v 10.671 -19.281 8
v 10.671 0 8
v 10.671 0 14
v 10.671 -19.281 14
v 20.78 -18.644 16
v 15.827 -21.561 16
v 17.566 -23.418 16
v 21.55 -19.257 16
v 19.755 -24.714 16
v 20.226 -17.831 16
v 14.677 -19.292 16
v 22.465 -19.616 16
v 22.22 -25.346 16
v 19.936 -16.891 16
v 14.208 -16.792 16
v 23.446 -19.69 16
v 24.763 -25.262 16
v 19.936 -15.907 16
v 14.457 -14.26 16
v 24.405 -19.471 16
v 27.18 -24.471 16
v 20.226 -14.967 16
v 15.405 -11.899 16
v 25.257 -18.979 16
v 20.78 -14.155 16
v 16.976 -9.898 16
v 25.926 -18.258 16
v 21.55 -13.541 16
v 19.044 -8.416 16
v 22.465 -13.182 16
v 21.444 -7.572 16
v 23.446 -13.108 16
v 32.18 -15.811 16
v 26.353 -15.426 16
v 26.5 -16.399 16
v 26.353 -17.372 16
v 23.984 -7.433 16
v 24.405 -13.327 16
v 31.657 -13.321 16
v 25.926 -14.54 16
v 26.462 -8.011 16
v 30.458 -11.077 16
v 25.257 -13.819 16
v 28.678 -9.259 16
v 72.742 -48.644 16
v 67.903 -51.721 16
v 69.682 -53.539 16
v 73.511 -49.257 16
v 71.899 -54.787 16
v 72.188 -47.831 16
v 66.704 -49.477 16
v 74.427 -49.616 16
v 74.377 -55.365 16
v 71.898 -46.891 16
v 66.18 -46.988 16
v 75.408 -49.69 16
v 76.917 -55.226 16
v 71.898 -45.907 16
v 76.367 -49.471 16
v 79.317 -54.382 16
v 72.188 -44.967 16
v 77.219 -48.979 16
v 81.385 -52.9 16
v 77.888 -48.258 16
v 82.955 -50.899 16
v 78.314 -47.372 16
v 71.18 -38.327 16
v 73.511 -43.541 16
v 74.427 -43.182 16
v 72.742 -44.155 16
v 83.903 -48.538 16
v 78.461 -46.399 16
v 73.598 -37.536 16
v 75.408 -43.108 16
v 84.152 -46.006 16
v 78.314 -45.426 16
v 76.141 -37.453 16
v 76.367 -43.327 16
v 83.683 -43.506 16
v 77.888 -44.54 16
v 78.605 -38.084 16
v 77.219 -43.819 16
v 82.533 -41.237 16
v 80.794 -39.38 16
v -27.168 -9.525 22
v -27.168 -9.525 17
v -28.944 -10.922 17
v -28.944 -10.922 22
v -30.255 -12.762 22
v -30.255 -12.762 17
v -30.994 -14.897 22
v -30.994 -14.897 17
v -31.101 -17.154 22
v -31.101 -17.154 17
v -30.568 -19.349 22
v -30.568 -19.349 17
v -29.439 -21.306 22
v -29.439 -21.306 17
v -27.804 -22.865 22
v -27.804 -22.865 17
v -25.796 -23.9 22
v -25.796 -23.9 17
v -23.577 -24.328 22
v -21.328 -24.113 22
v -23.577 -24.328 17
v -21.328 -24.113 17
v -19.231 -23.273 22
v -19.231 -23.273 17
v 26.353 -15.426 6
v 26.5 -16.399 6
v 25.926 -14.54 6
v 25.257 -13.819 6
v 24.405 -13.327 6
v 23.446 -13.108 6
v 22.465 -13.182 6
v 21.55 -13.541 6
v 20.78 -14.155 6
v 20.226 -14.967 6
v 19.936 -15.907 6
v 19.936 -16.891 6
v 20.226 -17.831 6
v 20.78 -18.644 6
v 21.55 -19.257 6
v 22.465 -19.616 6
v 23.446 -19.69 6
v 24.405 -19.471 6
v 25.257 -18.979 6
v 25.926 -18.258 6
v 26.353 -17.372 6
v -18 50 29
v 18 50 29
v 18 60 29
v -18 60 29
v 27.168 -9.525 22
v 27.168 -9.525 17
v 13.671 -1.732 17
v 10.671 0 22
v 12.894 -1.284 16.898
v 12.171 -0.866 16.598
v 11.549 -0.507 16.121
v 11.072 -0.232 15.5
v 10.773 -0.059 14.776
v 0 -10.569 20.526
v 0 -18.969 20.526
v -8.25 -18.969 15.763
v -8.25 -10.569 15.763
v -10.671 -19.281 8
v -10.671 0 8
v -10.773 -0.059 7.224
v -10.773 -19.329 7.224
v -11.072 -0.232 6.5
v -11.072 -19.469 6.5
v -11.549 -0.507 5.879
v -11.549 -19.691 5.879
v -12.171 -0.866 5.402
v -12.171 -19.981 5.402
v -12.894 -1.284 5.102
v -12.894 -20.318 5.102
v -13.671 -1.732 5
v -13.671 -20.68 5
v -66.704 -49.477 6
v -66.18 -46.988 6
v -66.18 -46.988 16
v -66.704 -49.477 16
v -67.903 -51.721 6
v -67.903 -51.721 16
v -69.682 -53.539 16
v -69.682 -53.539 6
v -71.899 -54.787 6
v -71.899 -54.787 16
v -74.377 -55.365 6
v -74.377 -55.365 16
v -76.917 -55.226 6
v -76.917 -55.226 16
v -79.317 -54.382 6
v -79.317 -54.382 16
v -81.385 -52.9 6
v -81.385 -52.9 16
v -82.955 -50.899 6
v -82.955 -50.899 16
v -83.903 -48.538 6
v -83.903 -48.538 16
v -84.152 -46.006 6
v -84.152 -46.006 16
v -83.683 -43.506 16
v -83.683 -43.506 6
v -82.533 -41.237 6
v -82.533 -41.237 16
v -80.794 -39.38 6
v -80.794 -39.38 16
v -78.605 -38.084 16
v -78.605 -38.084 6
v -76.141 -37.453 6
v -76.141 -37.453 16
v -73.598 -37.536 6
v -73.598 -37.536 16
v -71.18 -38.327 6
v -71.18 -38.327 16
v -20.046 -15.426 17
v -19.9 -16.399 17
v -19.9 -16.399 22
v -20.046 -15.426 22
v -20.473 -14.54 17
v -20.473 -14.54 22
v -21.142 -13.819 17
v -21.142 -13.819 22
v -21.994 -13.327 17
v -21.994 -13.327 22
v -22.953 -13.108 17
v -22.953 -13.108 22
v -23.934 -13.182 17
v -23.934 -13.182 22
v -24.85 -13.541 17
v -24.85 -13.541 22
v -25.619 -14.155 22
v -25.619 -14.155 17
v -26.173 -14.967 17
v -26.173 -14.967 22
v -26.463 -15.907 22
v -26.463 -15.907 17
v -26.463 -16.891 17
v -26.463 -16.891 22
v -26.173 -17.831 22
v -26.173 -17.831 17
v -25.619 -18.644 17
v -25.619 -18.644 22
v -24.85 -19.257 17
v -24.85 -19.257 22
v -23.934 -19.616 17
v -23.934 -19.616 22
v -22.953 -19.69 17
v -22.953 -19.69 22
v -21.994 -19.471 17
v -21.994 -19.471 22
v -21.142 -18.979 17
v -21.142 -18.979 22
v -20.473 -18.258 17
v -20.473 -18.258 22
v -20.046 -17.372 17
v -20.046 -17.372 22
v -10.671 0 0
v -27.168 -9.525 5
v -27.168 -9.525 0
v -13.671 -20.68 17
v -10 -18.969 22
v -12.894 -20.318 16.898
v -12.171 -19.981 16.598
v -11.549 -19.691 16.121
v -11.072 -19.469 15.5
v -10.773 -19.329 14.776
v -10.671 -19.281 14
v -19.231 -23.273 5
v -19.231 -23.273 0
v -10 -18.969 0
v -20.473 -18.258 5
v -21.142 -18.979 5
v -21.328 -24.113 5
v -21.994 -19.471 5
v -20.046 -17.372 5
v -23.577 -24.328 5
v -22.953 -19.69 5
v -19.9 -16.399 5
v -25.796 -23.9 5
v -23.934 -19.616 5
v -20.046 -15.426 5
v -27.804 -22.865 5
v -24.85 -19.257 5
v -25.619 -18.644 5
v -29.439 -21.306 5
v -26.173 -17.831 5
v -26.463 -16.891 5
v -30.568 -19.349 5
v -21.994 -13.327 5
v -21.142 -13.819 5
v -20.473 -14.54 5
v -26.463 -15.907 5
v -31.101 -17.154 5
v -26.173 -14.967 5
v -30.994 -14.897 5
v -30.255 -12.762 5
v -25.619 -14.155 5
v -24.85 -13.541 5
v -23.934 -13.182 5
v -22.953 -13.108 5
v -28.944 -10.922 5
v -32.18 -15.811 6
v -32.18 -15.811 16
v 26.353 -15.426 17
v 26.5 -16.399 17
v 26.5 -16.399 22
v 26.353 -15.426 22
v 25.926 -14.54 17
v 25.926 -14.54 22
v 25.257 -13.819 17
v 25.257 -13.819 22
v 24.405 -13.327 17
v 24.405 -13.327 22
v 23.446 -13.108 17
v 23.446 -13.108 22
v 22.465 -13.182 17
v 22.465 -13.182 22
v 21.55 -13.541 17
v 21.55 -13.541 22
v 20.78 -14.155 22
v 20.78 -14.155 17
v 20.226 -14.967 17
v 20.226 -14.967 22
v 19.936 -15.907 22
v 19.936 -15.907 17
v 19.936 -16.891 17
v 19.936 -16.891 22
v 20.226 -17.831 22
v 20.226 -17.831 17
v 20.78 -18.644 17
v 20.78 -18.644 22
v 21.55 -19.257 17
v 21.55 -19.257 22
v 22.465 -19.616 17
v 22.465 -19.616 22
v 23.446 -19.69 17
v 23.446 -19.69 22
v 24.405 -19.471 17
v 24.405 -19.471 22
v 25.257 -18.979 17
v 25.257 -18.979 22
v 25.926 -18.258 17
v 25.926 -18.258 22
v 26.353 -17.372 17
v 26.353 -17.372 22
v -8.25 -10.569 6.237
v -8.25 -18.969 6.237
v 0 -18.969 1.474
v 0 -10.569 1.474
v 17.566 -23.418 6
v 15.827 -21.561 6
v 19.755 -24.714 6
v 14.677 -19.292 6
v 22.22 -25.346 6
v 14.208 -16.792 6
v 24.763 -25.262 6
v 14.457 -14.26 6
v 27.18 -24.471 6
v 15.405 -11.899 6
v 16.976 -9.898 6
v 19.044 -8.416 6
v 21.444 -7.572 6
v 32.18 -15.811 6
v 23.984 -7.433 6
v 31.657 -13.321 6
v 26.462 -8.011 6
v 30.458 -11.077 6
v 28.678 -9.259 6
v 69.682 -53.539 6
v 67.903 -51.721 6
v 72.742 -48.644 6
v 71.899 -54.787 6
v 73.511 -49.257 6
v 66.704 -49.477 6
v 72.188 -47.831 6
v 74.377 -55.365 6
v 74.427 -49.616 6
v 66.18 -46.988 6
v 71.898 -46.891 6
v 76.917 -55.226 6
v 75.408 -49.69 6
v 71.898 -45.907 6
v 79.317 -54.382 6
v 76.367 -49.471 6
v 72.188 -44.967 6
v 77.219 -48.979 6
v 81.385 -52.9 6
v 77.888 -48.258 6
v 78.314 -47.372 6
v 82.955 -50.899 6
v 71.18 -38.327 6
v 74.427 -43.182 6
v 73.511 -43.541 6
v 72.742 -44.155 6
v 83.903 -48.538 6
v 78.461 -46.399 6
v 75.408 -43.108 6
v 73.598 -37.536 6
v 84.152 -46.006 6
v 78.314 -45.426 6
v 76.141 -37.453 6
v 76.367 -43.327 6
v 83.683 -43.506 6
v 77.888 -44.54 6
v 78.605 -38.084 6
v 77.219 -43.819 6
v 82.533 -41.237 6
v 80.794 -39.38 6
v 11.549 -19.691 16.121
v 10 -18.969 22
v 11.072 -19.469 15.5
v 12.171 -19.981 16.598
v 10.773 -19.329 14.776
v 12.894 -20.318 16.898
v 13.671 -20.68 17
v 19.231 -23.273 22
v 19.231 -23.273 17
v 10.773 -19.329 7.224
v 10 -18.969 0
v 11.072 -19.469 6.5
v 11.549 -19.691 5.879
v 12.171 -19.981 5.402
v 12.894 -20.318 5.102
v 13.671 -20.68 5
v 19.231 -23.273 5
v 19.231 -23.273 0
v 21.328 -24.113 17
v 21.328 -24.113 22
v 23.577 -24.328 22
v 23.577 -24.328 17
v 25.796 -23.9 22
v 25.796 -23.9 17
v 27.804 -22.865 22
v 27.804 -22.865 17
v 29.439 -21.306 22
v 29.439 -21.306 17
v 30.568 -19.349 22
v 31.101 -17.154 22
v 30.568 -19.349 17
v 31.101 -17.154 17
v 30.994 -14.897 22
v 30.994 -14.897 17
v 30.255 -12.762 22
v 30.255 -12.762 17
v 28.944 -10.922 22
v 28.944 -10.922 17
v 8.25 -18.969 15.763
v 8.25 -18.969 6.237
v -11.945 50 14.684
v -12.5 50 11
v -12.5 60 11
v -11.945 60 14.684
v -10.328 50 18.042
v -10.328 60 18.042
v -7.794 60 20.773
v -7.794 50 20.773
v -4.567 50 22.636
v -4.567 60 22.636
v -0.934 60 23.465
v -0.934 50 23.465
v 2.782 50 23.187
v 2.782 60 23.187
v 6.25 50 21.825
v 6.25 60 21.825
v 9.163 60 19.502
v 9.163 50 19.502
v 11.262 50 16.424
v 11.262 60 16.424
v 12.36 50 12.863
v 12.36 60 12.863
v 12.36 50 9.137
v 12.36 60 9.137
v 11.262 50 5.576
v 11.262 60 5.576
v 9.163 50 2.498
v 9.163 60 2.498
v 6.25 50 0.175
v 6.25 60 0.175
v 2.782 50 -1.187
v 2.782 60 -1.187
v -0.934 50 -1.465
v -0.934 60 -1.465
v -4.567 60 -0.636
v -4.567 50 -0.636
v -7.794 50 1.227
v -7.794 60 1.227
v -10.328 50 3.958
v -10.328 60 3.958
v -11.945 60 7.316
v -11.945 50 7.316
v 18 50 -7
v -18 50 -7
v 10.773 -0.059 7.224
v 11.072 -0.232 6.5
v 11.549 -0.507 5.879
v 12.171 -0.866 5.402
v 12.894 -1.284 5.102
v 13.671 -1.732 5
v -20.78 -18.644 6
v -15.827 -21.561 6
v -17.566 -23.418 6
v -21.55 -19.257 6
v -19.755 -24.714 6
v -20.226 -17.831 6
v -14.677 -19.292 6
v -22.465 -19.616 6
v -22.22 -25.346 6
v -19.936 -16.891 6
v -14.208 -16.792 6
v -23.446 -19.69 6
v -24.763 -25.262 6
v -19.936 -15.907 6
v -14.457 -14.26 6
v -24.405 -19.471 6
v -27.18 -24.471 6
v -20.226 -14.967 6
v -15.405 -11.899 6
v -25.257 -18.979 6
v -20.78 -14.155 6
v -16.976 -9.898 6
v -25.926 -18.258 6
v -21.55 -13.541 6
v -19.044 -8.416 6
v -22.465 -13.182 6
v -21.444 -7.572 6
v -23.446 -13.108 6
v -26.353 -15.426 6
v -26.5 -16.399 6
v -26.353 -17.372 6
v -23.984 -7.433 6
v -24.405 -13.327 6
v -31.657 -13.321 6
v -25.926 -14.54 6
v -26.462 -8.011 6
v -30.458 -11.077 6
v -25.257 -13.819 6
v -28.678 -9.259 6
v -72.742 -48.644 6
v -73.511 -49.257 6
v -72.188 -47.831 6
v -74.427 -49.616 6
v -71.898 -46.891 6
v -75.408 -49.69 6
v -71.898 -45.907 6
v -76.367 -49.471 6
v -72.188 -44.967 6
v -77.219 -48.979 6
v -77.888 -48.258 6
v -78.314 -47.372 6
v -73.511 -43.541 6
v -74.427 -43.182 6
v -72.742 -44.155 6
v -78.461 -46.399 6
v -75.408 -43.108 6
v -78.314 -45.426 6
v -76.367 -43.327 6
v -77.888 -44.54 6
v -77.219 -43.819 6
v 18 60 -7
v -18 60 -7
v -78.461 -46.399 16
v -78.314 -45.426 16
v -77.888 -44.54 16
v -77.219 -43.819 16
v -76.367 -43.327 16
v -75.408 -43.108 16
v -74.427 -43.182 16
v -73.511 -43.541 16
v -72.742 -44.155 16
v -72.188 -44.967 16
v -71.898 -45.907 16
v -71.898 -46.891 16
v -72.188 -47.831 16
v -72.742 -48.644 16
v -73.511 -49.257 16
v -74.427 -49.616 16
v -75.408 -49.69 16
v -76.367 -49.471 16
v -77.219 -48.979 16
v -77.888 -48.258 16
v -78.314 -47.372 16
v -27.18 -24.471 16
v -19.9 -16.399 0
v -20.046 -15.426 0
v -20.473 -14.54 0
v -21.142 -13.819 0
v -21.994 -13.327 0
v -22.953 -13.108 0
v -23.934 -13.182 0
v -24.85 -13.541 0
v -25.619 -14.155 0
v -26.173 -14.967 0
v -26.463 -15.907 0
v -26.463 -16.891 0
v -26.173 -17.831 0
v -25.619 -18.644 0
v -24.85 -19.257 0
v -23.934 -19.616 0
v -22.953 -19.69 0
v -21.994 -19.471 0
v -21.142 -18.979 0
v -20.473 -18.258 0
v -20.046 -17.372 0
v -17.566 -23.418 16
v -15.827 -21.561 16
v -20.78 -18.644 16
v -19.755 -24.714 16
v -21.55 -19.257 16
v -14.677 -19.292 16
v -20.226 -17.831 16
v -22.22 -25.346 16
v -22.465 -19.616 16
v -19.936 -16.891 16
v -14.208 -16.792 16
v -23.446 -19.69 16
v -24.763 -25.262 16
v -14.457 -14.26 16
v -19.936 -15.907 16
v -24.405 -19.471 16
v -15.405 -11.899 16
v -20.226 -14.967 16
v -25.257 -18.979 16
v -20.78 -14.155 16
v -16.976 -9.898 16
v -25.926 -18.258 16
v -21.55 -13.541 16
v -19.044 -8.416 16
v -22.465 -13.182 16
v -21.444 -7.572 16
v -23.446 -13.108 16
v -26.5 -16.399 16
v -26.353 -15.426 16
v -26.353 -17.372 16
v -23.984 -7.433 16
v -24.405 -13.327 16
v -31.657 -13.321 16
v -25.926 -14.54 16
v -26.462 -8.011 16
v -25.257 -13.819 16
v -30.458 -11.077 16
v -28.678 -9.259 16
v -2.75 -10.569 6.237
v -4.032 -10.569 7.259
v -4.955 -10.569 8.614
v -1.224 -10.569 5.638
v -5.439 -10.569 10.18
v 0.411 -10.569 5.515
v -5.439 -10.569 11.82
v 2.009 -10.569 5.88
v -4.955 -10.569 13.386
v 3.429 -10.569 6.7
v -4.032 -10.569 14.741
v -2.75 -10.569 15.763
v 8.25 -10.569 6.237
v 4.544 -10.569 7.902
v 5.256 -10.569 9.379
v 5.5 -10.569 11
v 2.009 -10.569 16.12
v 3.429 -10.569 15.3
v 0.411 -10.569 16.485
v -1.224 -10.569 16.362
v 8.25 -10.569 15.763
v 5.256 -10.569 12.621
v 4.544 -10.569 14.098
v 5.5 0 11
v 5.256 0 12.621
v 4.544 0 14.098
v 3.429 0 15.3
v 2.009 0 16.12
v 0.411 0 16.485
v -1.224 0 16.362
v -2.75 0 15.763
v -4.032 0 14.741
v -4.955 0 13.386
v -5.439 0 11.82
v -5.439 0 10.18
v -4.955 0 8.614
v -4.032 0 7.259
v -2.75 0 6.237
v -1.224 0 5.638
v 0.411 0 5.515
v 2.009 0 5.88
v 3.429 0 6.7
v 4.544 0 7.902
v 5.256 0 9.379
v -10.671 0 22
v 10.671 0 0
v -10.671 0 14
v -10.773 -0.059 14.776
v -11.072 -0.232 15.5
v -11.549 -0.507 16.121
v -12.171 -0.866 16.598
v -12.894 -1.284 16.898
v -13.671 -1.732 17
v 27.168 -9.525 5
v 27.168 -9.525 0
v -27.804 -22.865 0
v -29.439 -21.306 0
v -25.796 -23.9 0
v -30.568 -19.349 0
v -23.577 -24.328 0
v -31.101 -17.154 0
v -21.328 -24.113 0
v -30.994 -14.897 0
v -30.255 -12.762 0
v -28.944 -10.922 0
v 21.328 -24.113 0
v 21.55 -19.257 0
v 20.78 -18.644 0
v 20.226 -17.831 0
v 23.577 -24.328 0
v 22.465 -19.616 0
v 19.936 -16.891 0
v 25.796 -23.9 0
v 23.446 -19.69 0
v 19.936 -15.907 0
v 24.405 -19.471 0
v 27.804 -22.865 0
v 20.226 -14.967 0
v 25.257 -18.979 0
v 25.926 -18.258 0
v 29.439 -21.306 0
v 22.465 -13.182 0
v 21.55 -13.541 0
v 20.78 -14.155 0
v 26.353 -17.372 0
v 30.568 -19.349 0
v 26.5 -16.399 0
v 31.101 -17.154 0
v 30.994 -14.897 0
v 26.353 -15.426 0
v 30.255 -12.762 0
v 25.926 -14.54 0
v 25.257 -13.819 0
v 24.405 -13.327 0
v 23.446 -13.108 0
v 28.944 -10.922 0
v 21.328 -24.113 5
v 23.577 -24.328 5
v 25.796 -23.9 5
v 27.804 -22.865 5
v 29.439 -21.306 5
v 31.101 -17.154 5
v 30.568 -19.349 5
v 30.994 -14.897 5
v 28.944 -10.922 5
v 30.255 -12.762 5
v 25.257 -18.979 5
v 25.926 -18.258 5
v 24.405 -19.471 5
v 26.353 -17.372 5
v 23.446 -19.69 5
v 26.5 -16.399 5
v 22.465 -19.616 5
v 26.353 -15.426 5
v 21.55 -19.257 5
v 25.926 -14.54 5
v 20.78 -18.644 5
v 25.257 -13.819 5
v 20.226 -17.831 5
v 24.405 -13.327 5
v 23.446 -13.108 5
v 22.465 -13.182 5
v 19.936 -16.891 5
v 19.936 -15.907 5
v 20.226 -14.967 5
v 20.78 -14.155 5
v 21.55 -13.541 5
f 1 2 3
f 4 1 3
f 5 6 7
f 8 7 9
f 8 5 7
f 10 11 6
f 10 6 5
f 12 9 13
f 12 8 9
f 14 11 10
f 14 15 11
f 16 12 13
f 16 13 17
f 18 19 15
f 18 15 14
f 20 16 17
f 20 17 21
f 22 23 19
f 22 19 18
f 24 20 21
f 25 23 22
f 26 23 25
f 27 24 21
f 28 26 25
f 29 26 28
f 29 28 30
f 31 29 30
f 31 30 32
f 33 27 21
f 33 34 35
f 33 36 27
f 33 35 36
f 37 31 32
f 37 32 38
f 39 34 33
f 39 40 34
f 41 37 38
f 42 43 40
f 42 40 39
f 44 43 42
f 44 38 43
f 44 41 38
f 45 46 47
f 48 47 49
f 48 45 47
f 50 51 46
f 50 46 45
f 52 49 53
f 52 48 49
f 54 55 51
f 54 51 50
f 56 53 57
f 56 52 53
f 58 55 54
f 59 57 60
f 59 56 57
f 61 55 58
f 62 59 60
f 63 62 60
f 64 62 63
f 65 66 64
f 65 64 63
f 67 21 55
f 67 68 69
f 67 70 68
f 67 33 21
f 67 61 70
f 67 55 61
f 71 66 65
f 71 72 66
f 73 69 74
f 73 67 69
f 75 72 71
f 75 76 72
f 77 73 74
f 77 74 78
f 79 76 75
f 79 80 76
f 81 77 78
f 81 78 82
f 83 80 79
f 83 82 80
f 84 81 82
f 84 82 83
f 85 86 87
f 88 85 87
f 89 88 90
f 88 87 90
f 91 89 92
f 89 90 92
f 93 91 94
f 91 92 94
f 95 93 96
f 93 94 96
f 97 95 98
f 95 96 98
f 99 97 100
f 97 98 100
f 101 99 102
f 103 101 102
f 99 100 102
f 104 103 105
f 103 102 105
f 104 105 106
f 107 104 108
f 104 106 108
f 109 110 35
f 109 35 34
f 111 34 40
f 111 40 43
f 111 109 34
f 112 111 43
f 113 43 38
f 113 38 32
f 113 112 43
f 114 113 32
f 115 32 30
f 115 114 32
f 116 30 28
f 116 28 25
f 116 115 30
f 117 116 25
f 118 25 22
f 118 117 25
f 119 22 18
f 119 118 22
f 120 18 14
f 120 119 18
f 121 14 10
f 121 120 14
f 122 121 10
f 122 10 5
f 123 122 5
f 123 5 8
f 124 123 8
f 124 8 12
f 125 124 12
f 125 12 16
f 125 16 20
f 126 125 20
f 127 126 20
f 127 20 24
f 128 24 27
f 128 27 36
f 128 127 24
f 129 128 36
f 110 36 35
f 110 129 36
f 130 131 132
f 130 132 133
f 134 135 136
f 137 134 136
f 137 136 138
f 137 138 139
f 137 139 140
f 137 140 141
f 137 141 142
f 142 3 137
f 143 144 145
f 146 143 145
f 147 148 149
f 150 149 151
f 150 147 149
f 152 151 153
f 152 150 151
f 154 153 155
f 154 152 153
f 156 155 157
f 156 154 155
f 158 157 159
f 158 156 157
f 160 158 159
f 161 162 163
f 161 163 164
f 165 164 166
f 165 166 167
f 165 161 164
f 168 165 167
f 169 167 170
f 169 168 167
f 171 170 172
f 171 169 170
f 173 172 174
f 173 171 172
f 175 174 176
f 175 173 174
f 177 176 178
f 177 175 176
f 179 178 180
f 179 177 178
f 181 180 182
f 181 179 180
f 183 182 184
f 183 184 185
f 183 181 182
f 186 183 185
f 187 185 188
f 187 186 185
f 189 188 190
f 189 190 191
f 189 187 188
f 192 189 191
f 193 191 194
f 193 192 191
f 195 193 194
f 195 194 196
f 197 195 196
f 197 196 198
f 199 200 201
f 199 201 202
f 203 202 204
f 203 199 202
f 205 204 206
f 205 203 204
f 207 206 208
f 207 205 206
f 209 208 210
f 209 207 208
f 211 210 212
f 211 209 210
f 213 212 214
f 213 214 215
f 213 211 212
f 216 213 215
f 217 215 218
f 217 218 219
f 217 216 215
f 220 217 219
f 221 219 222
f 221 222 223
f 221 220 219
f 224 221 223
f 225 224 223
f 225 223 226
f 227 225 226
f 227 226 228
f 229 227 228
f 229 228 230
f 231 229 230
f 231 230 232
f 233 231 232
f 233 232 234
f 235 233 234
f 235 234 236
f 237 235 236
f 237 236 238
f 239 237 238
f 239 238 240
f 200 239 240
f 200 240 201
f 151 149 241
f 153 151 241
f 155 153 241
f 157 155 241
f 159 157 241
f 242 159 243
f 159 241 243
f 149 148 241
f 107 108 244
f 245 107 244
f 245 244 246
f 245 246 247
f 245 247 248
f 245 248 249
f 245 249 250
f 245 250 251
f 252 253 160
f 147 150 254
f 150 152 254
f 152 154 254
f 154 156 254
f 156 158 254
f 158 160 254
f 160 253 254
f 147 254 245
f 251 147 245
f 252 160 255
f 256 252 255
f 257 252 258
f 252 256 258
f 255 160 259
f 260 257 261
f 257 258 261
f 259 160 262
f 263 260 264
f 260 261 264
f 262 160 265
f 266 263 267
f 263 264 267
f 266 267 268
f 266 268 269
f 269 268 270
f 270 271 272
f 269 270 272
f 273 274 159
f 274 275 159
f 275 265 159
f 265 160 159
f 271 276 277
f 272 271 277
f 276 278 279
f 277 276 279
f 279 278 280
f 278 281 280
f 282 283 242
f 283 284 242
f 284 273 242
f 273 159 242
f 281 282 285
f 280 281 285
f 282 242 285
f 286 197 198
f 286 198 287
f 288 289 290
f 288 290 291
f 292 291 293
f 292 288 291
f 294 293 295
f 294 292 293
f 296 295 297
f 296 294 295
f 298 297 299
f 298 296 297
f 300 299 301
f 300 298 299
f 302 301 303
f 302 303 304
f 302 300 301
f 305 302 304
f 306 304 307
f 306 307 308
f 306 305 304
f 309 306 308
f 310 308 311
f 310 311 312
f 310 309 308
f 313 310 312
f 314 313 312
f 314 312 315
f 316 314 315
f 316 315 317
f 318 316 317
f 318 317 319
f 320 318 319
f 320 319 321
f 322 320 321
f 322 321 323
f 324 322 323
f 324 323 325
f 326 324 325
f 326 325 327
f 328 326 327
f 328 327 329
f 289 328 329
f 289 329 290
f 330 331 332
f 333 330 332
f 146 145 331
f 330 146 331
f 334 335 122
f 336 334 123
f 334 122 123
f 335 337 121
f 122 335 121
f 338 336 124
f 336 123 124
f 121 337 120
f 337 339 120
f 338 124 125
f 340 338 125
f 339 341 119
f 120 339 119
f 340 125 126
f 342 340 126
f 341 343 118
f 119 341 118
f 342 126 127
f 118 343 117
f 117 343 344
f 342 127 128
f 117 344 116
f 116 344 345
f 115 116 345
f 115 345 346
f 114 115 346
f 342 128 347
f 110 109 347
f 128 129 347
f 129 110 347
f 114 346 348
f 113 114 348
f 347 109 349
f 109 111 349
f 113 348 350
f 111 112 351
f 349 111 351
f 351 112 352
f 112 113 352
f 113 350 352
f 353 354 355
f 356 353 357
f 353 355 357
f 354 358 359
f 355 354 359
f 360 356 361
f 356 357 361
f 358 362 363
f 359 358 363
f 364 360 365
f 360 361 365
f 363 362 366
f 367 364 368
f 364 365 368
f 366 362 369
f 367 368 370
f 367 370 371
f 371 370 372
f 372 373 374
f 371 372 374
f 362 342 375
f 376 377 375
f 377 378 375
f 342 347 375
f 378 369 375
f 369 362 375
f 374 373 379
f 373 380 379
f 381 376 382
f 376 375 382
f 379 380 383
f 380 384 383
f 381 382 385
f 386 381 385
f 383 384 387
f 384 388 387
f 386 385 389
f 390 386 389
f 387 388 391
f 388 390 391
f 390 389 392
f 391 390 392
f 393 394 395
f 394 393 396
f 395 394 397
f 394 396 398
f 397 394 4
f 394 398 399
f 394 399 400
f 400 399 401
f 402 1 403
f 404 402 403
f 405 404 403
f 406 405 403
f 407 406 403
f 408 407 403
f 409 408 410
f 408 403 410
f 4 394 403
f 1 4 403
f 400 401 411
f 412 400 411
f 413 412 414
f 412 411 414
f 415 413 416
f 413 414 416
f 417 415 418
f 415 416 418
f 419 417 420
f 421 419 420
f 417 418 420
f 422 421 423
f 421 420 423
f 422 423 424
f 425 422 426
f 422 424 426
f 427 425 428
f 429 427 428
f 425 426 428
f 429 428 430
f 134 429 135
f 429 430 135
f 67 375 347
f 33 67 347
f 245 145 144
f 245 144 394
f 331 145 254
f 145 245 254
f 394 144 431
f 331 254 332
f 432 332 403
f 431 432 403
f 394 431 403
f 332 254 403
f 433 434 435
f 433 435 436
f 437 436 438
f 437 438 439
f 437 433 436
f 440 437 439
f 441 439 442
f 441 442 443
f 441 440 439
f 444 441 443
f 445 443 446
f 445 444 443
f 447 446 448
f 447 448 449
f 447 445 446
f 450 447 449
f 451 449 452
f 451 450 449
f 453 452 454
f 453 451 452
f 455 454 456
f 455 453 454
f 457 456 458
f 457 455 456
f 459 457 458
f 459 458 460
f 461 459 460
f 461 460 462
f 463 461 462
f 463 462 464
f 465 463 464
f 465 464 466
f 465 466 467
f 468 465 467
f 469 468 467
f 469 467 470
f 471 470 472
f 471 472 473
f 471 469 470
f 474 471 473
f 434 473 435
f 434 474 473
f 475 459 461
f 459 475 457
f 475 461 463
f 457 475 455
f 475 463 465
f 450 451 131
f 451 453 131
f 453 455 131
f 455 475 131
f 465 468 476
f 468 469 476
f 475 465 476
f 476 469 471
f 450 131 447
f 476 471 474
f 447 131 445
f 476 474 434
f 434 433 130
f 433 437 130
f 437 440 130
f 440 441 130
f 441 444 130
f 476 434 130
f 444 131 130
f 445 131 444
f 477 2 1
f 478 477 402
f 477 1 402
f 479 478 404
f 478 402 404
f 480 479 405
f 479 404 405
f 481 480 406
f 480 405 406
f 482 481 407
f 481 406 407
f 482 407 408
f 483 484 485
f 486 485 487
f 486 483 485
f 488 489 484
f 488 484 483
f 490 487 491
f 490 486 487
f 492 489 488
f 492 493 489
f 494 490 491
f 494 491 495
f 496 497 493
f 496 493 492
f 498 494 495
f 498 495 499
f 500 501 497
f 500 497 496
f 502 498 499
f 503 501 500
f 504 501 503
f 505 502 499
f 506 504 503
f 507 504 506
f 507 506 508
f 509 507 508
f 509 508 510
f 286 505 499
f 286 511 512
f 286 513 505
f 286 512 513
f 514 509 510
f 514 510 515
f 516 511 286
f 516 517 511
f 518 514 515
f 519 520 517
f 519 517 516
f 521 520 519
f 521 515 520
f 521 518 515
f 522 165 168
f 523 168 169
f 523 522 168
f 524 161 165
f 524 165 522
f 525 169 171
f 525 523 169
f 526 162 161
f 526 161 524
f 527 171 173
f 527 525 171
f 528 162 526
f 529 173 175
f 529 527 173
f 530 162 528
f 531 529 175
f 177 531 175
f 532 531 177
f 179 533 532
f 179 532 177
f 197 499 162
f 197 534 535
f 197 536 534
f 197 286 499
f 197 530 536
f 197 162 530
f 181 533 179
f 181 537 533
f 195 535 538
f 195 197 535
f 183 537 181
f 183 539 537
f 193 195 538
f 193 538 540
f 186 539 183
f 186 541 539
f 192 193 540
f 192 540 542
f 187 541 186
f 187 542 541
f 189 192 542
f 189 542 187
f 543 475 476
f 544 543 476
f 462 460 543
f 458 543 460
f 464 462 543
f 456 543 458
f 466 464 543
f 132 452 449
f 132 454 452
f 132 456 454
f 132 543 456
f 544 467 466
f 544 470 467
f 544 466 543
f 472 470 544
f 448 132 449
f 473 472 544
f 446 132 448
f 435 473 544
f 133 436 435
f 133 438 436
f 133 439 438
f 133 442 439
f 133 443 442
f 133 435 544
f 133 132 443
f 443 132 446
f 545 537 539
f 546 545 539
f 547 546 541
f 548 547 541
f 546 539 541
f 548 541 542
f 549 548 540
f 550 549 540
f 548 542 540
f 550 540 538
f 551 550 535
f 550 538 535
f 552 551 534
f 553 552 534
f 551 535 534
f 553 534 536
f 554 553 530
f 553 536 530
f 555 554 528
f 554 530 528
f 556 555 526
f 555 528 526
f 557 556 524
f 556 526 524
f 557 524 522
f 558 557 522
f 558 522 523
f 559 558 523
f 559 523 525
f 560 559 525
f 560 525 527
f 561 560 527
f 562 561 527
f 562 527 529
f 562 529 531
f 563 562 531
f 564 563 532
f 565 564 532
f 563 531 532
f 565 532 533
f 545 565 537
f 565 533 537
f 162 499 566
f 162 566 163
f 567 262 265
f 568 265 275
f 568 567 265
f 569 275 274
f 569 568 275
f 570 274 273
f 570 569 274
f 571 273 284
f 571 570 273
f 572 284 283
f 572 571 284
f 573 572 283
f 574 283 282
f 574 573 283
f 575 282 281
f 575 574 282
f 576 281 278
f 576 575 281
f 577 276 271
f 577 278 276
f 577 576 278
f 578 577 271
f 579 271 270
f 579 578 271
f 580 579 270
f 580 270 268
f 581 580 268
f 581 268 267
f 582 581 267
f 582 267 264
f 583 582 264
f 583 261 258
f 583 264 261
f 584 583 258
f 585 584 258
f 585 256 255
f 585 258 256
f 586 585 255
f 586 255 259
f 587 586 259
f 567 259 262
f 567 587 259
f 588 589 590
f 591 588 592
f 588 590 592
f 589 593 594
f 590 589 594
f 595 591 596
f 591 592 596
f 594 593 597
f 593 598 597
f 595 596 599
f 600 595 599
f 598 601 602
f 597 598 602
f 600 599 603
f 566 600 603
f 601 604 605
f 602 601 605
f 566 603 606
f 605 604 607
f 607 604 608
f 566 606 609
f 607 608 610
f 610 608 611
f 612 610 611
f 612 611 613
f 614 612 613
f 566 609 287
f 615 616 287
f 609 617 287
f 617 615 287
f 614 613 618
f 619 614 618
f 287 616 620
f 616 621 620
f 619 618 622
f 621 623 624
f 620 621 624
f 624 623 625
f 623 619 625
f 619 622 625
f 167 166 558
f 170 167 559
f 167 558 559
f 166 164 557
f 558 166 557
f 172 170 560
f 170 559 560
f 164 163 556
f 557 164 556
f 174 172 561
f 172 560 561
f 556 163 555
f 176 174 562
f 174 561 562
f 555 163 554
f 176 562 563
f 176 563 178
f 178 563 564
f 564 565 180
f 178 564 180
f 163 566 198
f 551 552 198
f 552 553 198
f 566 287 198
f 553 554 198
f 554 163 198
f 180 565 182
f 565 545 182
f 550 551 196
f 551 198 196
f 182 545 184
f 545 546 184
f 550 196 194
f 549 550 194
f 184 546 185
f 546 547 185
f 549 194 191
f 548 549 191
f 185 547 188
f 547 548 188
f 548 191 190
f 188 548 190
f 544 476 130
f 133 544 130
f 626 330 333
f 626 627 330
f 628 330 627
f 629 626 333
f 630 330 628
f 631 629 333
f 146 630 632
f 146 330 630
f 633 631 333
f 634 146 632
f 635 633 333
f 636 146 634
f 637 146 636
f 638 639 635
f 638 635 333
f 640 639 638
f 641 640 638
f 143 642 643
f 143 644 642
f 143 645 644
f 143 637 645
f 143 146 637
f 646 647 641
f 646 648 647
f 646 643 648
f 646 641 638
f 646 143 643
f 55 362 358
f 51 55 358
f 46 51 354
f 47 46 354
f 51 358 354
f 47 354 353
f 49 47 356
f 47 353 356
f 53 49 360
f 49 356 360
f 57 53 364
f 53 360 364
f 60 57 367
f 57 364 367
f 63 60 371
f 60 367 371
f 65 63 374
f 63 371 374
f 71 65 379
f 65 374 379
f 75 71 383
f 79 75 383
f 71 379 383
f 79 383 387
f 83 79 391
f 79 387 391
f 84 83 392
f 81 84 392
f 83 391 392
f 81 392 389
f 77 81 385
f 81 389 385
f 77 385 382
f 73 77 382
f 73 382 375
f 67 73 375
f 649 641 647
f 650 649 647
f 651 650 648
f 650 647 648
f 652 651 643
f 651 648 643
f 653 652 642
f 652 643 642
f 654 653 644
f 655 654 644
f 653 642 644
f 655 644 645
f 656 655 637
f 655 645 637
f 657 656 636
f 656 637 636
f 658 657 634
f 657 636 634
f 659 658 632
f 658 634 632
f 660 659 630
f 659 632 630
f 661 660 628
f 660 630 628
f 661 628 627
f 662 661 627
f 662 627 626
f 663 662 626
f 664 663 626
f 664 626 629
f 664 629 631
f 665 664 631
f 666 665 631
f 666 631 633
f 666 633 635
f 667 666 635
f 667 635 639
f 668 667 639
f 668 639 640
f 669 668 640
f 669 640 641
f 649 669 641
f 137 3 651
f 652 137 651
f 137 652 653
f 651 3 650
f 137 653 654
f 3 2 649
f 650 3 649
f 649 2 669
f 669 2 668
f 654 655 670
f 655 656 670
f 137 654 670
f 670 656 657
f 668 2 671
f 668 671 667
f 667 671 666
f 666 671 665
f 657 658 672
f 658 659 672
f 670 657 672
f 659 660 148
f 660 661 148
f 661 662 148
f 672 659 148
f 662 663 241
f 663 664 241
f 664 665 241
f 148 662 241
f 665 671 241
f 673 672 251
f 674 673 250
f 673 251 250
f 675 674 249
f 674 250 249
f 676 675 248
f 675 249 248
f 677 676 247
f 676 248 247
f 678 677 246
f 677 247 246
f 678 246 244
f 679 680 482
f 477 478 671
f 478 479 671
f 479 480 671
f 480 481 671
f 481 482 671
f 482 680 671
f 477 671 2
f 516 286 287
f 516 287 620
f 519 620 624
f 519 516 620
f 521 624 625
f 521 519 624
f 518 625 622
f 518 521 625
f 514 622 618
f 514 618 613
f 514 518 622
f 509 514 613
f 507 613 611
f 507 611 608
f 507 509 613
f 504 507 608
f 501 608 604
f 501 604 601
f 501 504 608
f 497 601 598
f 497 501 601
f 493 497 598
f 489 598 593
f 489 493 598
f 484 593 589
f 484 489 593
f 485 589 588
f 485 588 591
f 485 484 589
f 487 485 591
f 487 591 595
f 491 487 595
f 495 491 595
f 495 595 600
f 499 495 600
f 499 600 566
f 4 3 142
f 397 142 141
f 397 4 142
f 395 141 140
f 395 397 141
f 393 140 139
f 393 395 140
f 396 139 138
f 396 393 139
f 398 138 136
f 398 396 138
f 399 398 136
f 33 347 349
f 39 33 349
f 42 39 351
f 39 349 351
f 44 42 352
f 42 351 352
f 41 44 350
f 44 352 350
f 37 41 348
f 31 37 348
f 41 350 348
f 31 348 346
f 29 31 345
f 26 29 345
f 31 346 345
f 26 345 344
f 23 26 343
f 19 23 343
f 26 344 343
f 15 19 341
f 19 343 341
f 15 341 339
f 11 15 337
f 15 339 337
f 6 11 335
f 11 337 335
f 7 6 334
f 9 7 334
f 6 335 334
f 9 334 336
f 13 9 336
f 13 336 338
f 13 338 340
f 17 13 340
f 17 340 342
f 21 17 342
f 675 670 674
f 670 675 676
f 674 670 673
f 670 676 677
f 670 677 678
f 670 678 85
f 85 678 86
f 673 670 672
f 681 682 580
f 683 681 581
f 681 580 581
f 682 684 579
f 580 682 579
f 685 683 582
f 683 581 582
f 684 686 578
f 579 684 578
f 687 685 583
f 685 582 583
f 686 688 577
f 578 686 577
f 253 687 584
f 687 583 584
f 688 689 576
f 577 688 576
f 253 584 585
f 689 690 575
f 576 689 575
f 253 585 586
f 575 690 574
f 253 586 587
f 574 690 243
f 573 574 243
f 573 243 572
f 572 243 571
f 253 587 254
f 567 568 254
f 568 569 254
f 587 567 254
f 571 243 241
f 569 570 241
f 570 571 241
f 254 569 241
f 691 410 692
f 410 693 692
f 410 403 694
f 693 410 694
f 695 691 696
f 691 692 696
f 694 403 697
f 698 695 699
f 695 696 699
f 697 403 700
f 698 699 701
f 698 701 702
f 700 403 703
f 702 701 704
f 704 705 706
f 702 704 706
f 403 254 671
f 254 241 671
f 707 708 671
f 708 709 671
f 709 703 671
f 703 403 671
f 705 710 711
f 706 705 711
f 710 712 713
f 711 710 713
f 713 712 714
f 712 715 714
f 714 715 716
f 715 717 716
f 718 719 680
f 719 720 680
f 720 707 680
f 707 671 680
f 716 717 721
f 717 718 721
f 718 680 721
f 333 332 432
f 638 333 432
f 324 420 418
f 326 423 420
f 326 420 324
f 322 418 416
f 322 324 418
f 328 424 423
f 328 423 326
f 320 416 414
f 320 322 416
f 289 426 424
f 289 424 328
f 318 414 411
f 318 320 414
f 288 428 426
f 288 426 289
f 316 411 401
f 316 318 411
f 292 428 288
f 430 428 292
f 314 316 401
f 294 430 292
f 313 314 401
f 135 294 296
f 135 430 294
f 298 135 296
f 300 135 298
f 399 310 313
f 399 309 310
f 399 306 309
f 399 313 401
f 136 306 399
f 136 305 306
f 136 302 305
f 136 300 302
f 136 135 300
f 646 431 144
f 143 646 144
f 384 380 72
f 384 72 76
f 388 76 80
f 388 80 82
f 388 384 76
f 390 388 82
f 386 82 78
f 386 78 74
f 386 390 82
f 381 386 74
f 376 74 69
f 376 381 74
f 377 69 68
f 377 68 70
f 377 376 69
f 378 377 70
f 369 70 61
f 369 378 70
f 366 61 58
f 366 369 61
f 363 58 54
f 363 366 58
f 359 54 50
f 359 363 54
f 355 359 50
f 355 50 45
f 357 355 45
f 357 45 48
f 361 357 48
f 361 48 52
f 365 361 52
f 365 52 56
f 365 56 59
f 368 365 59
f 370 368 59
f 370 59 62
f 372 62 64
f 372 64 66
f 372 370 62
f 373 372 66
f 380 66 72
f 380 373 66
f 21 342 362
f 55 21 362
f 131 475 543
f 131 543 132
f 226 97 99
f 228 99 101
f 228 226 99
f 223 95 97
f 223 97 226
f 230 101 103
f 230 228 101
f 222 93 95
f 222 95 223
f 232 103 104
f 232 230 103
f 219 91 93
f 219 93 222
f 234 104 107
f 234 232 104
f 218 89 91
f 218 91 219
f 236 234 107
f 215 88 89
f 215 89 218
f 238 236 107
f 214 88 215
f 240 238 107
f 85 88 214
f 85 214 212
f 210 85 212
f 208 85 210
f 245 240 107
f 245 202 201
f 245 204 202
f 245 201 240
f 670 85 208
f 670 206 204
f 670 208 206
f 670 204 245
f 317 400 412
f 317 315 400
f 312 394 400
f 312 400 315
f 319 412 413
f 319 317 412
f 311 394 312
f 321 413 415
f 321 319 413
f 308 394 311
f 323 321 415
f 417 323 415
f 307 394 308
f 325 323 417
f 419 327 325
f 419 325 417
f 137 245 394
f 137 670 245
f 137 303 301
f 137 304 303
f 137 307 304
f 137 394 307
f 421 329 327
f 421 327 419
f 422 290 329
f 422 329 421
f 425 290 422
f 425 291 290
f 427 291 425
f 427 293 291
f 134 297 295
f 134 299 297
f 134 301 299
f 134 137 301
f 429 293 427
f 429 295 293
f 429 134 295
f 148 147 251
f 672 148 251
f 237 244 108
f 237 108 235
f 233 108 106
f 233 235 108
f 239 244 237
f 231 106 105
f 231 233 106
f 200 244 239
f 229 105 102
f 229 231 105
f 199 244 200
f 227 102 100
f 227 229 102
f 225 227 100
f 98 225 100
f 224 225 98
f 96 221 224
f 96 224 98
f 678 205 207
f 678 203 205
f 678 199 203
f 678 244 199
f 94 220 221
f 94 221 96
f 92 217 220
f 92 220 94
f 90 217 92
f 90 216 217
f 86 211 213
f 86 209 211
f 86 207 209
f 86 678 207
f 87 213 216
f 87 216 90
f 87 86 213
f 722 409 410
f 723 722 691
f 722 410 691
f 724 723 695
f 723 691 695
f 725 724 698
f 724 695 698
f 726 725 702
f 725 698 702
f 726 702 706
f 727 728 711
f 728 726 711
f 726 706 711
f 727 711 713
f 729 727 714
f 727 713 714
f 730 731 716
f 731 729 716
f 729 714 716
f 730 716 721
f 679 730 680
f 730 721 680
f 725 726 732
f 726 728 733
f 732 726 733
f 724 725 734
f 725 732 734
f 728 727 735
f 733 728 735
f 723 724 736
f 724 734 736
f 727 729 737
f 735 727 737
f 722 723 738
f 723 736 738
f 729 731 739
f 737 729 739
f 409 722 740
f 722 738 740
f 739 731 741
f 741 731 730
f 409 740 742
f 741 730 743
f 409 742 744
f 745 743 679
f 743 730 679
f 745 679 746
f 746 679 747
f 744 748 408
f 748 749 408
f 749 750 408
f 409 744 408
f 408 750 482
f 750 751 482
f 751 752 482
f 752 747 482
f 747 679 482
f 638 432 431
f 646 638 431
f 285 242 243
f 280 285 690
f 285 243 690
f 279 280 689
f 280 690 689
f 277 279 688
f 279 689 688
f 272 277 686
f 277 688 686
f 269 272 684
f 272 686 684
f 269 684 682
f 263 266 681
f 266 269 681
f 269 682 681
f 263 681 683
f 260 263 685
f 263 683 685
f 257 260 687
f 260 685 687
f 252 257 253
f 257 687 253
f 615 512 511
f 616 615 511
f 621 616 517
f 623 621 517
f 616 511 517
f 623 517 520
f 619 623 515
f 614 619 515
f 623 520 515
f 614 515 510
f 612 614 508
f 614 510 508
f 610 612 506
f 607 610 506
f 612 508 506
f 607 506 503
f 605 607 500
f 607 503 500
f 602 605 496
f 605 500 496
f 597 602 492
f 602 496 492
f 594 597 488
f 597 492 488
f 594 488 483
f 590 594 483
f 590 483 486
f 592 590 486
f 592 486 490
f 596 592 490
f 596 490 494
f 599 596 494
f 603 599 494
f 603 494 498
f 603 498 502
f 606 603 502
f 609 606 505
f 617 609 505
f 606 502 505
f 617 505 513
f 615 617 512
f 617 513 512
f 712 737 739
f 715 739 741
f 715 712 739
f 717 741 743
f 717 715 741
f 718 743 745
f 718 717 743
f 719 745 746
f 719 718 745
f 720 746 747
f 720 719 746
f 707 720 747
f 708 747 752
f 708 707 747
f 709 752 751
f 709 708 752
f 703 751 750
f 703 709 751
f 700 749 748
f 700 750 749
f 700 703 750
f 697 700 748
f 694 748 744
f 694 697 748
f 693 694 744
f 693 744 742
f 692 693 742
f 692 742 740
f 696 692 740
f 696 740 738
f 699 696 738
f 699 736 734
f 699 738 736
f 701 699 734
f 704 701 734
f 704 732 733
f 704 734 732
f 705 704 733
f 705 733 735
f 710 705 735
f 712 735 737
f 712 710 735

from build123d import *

# Parameters (mm, degrees)
F0_R      = 3.3
F1_DEPTH  = 22
F2_R      = 5.5
F3_DEPTH  = 18.9697660486
F4_R      = 5.5
F5_DEPTH  = 8.4
F6_W      = 29.9312670497
F6_H      = 12
F7_DEPTH  = 24.3375766425
F8_R      = 3
F10_R     = 3.3
F11_DEPTH = 10
F14_W     = 36
F14_H     = 36
F14_R     = 12.5
F15_DEPTH = 10


with BuildPart() as f1:
    # F0 (on Top) → F1 (new body)
    with BuildSketch(Plane.XY):
        with BuildLine():
            Line((10.6705042752, 0), (0, 0))
            Line((0, 0), (-10.6705042752, 0))
            Line((-10.6705042752, 0), (-27.1682882173, -9.525))
            ThreePointArc((-27.1682882173, -9.525), (-30.0736148598, -20.3678266425), (-19.2307882173, -23.2731532851))
            Line((-19.2307882173, -23.2731532851), (-10, -18.9687660486))
            Line((-10, -18.9687660486), (0, -18.9687660486))
            Line((0, -18.9687660486), (10, -18.9687660486))
            Line((10, -18.9687660486), (19.2307882173, -23.2731532851))
            ThreePointArc((19.2307882173, -23.2731532851), (30.0736148598, -20.3678266425), (27.1682882173, -9.525))
            Line((27.1682882173, -9.525), (10.6705042752, 0))
        make_face()
        with Locations((-23.1995382173, -16.3990766425)):
            Circle(F0_R, mode=Mode.SUBTRACT)
        with Locations((23.1995382173, -16.3990766425)):
            Circle(F0_R, mode=Mode.SUBTRACT)
    extrude(amount=F1_DEPTH)

    # F2 (on face) → F3 (cut, through all)
    with BuildSketch(Plane.XZ.offset(18.9687660486)):
        with Locations((0, 11)):
            Circle(F2_R)
    extrude(amount=-F3_DEPTH, mode=Mode.SUBTRACT)

    # F4 (on face) → F5 (cut)
    with BuildSketch(Plane.XZ.offset(18.9687660486)):
        Polygon((-8.25, 15.7631397208), (-8.25, 6.2368602792), (0, 1.4737205584), (8.25, 6.2368602792), (8.25, 15.7631397208), (0, 20.5262794416), align=None)
        with Locations((0, 11)):
            Circle(F4_R, mode=Mode.SUBTRACT)
    extrude(amount=-F5_DEPTH, mode=Mode.SUBTRACT)

    # F6 (on face) → F7 (cut, through all)
    with BuildSketch(Plane(origin=(0, 0, 0), x_dir=(-1, 0, 0), z_dir=(0, 1, 0))):
        with Locations((-25.6361378, 11)):
            Rectangle(F6_W, F6_H)
        with Locations((25.6361378, 11)):
            Rectangle(F6_W, F6_H)
    extrude(amount=-F7_DEPTH, mode=Mode.SUBTRACT)

    # F8
    f8_edges = [f1.edges().sort_by_distance(p)[0] for p in [
        (10.670504, -9.640714, 5),
        (10.670504, -9.640714, 17),
        (-10.670504, -9.640714, 17),
        (-10.670504, -9.640714, 5),
    ]]
    fillet(f8_edges, radius=F8_R)


with BuildPart() as f11:
    # F10 (on offset) → F11 (new body)
    with BuildSketch(Plane.XY.offset(6)):
        with BuildLine():
            Line((71.1803217459, -38.3272922368), (32.1802789157, -15.8106070104))
            ThreePointArc((32.1802789157, -15.8106070104), (15.4053095832, -11.8990766425), (27.1802789157, -24.4708610482))
            Line((27.1802789157, -24.4708610482), (66.1803217459, -46.9875462747))
            ThreePointArc((66.1803217459, -46.9875462747), (82.9552910784, -50.8990766425), (71.1803217459, -38.3272922368))
        make_face()
        with Locations((75.1610624444, -46.3990766425)):
            Circle(F10_R, mode=Mode.SUBTRACT)
        with Locations((23.1995382173, -16.3990766425)):
            Circle(F10_R, mode=Mode.SUBTRACT)
    extrude(amount=F11_DEPTH)


with BuildPart() as f12_1:
    # F12: instance of F11
    add(f11.part.mirror(Plane.YZ))


with BuildPart() as f15:
    # F14 (on offset) → F15 (new body)
    with BuildSketch(Plane(origin=(0, 50, 0), x_dir=(-1, 0, 0), z_dir=(0, 1, 0))):
        with Locations((0, 11)):
            Rectangle(F14_W, F14_H)
        with Locations((0, 11)):
            Circle(F14_R, mode=Mode.SUBTRACT)
    extrude(amount=F15_DEPTH)


solid = Compound([f1.part, f11.part, f12_1.part, f15.part])
